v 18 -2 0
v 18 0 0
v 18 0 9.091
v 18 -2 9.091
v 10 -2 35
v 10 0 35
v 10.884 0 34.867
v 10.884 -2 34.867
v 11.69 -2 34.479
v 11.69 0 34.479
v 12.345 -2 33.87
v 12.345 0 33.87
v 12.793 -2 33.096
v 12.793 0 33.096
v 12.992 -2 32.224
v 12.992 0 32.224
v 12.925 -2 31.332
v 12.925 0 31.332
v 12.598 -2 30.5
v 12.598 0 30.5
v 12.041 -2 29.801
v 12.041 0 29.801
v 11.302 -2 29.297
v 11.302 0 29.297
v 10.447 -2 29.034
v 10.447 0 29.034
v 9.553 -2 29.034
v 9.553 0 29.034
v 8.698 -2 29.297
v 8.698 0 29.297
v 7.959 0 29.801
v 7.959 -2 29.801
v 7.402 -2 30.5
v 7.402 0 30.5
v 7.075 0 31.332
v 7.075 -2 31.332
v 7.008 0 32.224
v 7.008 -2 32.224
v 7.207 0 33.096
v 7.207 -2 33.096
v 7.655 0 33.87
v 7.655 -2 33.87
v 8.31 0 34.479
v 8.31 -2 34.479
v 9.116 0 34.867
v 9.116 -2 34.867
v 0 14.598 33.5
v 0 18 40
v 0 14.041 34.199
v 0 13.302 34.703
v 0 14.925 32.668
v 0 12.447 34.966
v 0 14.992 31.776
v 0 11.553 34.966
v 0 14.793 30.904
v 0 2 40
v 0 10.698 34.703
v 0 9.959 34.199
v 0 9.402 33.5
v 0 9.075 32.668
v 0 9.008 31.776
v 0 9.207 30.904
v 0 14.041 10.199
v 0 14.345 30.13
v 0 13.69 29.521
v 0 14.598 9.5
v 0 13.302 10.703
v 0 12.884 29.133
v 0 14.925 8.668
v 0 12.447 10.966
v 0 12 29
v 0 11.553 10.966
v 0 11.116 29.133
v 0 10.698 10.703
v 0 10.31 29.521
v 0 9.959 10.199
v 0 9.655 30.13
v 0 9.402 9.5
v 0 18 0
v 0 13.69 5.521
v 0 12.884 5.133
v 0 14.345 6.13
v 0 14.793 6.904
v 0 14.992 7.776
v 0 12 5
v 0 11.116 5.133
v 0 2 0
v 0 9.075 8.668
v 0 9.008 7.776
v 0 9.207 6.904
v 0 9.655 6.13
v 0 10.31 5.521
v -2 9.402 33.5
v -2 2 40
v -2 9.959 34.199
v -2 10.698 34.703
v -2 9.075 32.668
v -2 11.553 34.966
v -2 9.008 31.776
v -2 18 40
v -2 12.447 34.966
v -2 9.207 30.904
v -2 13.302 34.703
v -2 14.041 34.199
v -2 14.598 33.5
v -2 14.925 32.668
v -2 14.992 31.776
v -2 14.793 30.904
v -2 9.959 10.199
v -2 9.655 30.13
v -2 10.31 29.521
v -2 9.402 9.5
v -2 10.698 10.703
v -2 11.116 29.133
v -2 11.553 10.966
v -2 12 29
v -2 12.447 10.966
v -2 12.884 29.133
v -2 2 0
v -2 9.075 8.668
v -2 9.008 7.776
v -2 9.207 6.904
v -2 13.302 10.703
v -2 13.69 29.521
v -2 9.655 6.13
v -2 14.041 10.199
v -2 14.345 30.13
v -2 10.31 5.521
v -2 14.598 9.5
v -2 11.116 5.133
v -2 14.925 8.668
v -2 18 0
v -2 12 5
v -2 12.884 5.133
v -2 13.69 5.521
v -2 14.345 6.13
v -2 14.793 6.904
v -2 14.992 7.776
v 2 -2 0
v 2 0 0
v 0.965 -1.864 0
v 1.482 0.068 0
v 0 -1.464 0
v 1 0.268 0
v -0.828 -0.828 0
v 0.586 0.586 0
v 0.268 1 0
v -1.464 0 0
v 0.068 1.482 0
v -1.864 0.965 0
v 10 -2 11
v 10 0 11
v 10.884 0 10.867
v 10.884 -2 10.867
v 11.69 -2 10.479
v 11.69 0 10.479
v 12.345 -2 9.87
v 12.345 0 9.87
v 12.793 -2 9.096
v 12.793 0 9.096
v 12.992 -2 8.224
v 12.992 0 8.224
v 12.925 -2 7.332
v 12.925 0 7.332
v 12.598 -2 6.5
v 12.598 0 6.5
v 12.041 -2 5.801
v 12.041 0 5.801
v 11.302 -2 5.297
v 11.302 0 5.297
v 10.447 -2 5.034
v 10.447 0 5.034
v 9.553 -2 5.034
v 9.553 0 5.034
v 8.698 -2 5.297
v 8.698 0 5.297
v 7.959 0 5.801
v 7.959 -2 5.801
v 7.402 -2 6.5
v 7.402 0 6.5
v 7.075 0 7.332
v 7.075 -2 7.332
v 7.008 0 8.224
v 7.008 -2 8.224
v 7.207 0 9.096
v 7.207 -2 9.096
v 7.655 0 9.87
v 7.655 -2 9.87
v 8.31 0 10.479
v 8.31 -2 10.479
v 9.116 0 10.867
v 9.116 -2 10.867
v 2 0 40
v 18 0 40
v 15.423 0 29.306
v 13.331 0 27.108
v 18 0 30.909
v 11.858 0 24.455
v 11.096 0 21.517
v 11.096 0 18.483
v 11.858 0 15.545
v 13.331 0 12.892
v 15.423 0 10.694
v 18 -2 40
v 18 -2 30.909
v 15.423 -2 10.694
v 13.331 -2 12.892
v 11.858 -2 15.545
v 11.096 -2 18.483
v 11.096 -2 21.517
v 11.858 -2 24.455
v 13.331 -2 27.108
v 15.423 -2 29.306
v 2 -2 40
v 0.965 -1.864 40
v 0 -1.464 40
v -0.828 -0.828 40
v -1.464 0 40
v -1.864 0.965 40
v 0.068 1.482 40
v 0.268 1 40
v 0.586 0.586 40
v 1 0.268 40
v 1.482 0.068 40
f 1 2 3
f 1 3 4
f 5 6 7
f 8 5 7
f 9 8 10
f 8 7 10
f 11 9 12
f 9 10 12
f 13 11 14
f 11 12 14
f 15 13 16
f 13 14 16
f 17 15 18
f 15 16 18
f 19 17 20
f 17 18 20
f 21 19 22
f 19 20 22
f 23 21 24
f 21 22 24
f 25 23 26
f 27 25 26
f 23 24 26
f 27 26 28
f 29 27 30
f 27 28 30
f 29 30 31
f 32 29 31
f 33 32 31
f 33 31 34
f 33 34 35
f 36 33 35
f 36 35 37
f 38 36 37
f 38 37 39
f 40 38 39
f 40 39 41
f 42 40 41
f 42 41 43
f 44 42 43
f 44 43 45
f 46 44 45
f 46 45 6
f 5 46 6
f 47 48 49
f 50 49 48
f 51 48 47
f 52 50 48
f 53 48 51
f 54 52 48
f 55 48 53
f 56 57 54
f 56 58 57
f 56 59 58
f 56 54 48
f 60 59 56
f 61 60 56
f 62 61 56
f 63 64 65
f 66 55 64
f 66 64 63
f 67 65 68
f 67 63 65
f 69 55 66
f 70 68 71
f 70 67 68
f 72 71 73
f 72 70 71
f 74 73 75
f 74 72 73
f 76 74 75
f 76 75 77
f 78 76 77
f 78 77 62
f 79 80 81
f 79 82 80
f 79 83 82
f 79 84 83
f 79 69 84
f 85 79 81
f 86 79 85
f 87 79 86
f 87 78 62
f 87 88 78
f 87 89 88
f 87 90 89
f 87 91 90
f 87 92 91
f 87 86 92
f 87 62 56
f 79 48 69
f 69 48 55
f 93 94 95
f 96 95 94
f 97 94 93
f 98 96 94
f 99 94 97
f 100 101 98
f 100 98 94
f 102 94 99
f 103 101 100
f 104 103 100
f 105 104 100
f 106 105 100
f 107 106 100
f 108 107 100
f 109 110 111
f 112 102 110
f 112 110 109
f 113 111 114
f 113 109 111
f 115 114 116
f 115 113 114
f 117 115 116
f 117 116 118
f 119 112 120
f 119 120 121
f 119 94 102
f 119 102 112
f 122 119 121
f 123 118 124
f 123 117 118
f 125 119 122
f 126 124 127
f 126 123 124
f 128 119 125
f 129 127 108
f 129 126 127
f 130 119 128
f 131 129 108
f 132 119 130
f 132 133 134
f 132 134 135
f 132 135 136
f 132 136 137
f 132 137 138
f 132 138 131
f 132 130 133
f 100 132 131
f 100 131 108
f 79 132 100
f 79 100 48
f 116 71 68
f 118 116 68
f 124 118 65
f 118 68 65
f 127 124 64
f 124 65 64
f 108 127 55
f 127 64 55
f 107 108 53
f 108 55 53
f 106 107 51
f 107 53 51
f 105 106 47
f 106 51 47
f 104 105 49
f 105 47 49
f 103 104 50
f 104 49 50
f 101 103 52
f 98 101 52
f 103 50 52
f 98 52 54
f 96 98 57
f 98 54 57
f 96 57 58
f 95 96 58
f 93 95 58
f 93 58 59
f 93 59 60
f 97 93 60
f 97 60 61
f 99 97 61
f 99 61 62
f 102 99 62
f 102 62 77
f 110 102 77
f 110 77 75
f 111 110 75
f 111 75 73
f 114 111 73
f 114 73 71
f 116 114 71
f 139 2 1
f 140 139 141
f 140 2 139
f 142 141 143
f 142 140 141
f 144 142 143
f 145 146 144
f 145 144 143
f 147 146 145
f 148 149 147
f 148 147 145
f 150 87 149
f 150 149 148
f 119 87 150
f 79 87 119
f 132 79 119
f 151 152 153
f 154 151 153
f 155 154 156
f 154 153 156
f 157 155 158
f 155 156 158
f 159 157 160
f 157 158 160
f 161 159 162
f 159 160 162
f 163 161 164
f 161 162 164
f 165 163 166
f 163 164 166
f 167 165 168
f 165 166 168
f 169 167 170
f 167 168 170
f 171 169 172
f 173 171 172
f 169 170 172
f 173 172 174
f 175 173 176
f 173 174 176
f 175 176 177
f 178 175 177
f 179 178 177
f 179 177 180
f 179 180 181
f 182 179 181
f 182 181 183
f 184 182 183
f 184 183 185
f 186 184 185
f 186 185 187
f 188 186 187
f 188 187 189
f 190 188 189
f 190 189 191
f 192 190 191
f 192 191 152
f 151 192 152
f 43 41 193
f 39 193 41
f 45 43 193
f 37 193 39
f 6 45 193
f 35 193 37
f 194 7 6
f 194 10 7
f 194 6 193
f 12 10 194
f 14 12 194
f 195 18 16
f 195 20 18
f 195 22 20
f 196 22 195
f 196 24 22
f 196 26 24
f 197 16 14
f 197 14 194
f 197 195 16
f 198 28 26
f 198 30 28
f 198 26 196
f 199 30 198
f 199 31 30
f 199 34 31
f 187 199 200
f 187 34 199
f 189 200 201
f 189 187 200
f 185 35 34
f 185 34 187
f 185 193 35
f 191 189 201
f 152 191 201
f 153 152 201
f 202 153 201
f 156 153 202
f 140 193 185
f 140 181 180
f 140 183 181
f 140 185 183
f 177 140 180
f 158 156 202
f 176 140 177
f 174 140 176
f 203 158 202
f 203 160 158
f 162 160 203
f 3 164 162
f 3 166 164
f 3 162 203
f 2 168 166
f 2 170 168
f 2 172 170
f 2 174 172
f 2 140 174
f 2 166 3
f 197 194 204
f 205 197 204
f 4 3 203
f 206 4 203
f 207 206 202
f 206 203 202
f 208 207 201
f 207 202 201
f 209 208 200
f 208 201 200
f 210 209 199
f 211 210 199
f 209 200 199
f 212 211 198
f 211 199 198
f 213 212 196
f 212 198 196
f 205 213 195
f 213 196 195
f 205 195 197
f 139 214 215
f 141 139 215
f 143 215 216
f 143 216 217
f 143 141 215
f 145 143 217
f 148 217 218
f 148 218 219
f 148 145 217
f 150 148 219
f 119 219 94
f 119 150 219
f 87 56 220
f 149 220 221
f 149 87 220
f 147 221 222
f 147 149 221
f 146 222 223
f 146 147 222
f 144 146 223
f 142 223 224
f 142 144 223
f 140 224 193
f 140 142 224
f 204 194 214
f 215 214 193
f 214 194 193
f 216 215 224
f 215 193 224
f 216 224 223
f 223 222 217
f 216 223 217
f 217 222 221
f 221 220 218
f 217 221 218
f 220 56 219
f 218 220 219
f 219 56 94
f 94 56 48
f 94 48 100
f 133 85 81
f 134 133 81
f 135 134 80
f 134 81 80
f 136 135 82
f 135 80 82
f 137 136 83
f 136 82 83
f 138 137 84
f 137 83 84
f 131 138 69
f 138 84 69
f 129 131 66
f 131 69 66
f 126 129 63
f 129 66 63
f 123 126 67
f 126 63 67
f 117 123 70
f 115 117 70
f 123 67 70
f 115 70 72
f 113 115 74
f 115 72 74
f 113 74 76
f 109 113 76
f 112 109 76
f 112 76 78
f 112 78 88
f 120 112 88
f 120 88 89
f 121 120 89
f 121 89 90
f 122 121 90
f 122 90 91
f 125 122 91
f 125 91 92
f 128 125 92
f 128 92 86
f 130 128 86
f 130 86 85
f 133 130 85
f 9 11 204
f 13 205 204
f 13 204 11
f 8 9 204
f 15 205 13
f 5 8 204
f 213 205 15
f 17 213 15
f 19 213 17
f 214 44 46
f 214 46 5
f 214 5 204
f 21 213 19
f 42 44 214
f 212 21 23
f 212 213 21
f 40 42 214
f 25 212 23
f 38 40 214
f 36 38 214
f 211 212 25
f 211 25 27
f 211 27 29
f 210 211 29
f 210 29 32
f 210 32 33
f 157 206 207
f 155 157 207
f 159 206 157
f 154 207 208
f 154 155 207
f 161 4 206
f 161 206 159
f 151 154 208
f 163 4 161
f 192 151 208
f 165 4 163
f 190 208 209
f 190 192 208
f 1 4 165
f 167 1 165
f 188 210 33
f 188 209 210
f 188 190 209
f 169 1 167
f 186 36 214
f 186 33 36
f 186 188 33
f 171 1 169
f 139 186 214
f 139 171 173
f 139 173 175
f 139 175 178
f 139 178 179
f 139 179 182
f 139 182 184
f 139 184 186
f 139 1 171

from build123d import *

# Parameters (mm, degrees)
BASE_FLANGE2_DEPTH = 40
SKETCH11_R         = 3
CUT_EXTRUDE2_DEPTH = 10
SKETCH12_R         = 12
SKETCH12_R_2       = 3
CUT_EXTRUDE3_DEPTH = 10


# Sheet-metal steps are written as plain solids
with BuildPart() as part:
    # Sketch1 → Base-Flange2 (new body)
    with BuildSketch(Plane.XY):
        with BuildLine():
            Line((0, 18), (0, 2))
            ThreePointArc((0, 2), (0.585786438, 0.585786438), (2, 0))
            Line((2, 0), (18, 0))
            Line((18, 0), (18, -2))
            Line((18, -2), (2, -2))
            ThreePointArc((2, -2), (-0.828427125, -0.828427125), (-2, 2))
            Line((-2, 2), (-2, 18))
            Line((-2, 18), (0, 18))
        make_face()
    extrude(amount=BASE_FLANGE2_DEPTH)

    # Sketch11 → Cut-Extrude2 (cut)
    with BuildSketch(Plane(origin=(0, 0, 0), x_dir=(0, 0, -1), z_dir=(1, 0, 0))):
        with Locations((-32, 12)):
            Circle(SKETCH11_R)
        with Locations((-8, 12)):
            Circle(SKETCH11_R)
    extrude(amount=-CUT_EXTRUDE2_DEPTH, mode=Mode.SUBTRACT)

    # Sketch12 → Cut-Extrude3 (cut)
    with BuildSketch(Plane(origin=(0, 0, 0), x_dir=(1, 0, 0), z_dir=(0, 1, 0))):
        with Locations((23, -20)):
            Circle(SKETCH12_R)
        with Locations(Location((10, -8, 0), (0, 0, 270))):
            Circle(SKETCH12_R_2)
        with Locations(Location((10, -32, 0), (0, 0, 270))):
            Circle(SKETCH12_R_2)
    extrude(amount=-CUT_EXTRUDE3_DEPTH, mode=Mode.SUBTRACT)


solid = part.part
